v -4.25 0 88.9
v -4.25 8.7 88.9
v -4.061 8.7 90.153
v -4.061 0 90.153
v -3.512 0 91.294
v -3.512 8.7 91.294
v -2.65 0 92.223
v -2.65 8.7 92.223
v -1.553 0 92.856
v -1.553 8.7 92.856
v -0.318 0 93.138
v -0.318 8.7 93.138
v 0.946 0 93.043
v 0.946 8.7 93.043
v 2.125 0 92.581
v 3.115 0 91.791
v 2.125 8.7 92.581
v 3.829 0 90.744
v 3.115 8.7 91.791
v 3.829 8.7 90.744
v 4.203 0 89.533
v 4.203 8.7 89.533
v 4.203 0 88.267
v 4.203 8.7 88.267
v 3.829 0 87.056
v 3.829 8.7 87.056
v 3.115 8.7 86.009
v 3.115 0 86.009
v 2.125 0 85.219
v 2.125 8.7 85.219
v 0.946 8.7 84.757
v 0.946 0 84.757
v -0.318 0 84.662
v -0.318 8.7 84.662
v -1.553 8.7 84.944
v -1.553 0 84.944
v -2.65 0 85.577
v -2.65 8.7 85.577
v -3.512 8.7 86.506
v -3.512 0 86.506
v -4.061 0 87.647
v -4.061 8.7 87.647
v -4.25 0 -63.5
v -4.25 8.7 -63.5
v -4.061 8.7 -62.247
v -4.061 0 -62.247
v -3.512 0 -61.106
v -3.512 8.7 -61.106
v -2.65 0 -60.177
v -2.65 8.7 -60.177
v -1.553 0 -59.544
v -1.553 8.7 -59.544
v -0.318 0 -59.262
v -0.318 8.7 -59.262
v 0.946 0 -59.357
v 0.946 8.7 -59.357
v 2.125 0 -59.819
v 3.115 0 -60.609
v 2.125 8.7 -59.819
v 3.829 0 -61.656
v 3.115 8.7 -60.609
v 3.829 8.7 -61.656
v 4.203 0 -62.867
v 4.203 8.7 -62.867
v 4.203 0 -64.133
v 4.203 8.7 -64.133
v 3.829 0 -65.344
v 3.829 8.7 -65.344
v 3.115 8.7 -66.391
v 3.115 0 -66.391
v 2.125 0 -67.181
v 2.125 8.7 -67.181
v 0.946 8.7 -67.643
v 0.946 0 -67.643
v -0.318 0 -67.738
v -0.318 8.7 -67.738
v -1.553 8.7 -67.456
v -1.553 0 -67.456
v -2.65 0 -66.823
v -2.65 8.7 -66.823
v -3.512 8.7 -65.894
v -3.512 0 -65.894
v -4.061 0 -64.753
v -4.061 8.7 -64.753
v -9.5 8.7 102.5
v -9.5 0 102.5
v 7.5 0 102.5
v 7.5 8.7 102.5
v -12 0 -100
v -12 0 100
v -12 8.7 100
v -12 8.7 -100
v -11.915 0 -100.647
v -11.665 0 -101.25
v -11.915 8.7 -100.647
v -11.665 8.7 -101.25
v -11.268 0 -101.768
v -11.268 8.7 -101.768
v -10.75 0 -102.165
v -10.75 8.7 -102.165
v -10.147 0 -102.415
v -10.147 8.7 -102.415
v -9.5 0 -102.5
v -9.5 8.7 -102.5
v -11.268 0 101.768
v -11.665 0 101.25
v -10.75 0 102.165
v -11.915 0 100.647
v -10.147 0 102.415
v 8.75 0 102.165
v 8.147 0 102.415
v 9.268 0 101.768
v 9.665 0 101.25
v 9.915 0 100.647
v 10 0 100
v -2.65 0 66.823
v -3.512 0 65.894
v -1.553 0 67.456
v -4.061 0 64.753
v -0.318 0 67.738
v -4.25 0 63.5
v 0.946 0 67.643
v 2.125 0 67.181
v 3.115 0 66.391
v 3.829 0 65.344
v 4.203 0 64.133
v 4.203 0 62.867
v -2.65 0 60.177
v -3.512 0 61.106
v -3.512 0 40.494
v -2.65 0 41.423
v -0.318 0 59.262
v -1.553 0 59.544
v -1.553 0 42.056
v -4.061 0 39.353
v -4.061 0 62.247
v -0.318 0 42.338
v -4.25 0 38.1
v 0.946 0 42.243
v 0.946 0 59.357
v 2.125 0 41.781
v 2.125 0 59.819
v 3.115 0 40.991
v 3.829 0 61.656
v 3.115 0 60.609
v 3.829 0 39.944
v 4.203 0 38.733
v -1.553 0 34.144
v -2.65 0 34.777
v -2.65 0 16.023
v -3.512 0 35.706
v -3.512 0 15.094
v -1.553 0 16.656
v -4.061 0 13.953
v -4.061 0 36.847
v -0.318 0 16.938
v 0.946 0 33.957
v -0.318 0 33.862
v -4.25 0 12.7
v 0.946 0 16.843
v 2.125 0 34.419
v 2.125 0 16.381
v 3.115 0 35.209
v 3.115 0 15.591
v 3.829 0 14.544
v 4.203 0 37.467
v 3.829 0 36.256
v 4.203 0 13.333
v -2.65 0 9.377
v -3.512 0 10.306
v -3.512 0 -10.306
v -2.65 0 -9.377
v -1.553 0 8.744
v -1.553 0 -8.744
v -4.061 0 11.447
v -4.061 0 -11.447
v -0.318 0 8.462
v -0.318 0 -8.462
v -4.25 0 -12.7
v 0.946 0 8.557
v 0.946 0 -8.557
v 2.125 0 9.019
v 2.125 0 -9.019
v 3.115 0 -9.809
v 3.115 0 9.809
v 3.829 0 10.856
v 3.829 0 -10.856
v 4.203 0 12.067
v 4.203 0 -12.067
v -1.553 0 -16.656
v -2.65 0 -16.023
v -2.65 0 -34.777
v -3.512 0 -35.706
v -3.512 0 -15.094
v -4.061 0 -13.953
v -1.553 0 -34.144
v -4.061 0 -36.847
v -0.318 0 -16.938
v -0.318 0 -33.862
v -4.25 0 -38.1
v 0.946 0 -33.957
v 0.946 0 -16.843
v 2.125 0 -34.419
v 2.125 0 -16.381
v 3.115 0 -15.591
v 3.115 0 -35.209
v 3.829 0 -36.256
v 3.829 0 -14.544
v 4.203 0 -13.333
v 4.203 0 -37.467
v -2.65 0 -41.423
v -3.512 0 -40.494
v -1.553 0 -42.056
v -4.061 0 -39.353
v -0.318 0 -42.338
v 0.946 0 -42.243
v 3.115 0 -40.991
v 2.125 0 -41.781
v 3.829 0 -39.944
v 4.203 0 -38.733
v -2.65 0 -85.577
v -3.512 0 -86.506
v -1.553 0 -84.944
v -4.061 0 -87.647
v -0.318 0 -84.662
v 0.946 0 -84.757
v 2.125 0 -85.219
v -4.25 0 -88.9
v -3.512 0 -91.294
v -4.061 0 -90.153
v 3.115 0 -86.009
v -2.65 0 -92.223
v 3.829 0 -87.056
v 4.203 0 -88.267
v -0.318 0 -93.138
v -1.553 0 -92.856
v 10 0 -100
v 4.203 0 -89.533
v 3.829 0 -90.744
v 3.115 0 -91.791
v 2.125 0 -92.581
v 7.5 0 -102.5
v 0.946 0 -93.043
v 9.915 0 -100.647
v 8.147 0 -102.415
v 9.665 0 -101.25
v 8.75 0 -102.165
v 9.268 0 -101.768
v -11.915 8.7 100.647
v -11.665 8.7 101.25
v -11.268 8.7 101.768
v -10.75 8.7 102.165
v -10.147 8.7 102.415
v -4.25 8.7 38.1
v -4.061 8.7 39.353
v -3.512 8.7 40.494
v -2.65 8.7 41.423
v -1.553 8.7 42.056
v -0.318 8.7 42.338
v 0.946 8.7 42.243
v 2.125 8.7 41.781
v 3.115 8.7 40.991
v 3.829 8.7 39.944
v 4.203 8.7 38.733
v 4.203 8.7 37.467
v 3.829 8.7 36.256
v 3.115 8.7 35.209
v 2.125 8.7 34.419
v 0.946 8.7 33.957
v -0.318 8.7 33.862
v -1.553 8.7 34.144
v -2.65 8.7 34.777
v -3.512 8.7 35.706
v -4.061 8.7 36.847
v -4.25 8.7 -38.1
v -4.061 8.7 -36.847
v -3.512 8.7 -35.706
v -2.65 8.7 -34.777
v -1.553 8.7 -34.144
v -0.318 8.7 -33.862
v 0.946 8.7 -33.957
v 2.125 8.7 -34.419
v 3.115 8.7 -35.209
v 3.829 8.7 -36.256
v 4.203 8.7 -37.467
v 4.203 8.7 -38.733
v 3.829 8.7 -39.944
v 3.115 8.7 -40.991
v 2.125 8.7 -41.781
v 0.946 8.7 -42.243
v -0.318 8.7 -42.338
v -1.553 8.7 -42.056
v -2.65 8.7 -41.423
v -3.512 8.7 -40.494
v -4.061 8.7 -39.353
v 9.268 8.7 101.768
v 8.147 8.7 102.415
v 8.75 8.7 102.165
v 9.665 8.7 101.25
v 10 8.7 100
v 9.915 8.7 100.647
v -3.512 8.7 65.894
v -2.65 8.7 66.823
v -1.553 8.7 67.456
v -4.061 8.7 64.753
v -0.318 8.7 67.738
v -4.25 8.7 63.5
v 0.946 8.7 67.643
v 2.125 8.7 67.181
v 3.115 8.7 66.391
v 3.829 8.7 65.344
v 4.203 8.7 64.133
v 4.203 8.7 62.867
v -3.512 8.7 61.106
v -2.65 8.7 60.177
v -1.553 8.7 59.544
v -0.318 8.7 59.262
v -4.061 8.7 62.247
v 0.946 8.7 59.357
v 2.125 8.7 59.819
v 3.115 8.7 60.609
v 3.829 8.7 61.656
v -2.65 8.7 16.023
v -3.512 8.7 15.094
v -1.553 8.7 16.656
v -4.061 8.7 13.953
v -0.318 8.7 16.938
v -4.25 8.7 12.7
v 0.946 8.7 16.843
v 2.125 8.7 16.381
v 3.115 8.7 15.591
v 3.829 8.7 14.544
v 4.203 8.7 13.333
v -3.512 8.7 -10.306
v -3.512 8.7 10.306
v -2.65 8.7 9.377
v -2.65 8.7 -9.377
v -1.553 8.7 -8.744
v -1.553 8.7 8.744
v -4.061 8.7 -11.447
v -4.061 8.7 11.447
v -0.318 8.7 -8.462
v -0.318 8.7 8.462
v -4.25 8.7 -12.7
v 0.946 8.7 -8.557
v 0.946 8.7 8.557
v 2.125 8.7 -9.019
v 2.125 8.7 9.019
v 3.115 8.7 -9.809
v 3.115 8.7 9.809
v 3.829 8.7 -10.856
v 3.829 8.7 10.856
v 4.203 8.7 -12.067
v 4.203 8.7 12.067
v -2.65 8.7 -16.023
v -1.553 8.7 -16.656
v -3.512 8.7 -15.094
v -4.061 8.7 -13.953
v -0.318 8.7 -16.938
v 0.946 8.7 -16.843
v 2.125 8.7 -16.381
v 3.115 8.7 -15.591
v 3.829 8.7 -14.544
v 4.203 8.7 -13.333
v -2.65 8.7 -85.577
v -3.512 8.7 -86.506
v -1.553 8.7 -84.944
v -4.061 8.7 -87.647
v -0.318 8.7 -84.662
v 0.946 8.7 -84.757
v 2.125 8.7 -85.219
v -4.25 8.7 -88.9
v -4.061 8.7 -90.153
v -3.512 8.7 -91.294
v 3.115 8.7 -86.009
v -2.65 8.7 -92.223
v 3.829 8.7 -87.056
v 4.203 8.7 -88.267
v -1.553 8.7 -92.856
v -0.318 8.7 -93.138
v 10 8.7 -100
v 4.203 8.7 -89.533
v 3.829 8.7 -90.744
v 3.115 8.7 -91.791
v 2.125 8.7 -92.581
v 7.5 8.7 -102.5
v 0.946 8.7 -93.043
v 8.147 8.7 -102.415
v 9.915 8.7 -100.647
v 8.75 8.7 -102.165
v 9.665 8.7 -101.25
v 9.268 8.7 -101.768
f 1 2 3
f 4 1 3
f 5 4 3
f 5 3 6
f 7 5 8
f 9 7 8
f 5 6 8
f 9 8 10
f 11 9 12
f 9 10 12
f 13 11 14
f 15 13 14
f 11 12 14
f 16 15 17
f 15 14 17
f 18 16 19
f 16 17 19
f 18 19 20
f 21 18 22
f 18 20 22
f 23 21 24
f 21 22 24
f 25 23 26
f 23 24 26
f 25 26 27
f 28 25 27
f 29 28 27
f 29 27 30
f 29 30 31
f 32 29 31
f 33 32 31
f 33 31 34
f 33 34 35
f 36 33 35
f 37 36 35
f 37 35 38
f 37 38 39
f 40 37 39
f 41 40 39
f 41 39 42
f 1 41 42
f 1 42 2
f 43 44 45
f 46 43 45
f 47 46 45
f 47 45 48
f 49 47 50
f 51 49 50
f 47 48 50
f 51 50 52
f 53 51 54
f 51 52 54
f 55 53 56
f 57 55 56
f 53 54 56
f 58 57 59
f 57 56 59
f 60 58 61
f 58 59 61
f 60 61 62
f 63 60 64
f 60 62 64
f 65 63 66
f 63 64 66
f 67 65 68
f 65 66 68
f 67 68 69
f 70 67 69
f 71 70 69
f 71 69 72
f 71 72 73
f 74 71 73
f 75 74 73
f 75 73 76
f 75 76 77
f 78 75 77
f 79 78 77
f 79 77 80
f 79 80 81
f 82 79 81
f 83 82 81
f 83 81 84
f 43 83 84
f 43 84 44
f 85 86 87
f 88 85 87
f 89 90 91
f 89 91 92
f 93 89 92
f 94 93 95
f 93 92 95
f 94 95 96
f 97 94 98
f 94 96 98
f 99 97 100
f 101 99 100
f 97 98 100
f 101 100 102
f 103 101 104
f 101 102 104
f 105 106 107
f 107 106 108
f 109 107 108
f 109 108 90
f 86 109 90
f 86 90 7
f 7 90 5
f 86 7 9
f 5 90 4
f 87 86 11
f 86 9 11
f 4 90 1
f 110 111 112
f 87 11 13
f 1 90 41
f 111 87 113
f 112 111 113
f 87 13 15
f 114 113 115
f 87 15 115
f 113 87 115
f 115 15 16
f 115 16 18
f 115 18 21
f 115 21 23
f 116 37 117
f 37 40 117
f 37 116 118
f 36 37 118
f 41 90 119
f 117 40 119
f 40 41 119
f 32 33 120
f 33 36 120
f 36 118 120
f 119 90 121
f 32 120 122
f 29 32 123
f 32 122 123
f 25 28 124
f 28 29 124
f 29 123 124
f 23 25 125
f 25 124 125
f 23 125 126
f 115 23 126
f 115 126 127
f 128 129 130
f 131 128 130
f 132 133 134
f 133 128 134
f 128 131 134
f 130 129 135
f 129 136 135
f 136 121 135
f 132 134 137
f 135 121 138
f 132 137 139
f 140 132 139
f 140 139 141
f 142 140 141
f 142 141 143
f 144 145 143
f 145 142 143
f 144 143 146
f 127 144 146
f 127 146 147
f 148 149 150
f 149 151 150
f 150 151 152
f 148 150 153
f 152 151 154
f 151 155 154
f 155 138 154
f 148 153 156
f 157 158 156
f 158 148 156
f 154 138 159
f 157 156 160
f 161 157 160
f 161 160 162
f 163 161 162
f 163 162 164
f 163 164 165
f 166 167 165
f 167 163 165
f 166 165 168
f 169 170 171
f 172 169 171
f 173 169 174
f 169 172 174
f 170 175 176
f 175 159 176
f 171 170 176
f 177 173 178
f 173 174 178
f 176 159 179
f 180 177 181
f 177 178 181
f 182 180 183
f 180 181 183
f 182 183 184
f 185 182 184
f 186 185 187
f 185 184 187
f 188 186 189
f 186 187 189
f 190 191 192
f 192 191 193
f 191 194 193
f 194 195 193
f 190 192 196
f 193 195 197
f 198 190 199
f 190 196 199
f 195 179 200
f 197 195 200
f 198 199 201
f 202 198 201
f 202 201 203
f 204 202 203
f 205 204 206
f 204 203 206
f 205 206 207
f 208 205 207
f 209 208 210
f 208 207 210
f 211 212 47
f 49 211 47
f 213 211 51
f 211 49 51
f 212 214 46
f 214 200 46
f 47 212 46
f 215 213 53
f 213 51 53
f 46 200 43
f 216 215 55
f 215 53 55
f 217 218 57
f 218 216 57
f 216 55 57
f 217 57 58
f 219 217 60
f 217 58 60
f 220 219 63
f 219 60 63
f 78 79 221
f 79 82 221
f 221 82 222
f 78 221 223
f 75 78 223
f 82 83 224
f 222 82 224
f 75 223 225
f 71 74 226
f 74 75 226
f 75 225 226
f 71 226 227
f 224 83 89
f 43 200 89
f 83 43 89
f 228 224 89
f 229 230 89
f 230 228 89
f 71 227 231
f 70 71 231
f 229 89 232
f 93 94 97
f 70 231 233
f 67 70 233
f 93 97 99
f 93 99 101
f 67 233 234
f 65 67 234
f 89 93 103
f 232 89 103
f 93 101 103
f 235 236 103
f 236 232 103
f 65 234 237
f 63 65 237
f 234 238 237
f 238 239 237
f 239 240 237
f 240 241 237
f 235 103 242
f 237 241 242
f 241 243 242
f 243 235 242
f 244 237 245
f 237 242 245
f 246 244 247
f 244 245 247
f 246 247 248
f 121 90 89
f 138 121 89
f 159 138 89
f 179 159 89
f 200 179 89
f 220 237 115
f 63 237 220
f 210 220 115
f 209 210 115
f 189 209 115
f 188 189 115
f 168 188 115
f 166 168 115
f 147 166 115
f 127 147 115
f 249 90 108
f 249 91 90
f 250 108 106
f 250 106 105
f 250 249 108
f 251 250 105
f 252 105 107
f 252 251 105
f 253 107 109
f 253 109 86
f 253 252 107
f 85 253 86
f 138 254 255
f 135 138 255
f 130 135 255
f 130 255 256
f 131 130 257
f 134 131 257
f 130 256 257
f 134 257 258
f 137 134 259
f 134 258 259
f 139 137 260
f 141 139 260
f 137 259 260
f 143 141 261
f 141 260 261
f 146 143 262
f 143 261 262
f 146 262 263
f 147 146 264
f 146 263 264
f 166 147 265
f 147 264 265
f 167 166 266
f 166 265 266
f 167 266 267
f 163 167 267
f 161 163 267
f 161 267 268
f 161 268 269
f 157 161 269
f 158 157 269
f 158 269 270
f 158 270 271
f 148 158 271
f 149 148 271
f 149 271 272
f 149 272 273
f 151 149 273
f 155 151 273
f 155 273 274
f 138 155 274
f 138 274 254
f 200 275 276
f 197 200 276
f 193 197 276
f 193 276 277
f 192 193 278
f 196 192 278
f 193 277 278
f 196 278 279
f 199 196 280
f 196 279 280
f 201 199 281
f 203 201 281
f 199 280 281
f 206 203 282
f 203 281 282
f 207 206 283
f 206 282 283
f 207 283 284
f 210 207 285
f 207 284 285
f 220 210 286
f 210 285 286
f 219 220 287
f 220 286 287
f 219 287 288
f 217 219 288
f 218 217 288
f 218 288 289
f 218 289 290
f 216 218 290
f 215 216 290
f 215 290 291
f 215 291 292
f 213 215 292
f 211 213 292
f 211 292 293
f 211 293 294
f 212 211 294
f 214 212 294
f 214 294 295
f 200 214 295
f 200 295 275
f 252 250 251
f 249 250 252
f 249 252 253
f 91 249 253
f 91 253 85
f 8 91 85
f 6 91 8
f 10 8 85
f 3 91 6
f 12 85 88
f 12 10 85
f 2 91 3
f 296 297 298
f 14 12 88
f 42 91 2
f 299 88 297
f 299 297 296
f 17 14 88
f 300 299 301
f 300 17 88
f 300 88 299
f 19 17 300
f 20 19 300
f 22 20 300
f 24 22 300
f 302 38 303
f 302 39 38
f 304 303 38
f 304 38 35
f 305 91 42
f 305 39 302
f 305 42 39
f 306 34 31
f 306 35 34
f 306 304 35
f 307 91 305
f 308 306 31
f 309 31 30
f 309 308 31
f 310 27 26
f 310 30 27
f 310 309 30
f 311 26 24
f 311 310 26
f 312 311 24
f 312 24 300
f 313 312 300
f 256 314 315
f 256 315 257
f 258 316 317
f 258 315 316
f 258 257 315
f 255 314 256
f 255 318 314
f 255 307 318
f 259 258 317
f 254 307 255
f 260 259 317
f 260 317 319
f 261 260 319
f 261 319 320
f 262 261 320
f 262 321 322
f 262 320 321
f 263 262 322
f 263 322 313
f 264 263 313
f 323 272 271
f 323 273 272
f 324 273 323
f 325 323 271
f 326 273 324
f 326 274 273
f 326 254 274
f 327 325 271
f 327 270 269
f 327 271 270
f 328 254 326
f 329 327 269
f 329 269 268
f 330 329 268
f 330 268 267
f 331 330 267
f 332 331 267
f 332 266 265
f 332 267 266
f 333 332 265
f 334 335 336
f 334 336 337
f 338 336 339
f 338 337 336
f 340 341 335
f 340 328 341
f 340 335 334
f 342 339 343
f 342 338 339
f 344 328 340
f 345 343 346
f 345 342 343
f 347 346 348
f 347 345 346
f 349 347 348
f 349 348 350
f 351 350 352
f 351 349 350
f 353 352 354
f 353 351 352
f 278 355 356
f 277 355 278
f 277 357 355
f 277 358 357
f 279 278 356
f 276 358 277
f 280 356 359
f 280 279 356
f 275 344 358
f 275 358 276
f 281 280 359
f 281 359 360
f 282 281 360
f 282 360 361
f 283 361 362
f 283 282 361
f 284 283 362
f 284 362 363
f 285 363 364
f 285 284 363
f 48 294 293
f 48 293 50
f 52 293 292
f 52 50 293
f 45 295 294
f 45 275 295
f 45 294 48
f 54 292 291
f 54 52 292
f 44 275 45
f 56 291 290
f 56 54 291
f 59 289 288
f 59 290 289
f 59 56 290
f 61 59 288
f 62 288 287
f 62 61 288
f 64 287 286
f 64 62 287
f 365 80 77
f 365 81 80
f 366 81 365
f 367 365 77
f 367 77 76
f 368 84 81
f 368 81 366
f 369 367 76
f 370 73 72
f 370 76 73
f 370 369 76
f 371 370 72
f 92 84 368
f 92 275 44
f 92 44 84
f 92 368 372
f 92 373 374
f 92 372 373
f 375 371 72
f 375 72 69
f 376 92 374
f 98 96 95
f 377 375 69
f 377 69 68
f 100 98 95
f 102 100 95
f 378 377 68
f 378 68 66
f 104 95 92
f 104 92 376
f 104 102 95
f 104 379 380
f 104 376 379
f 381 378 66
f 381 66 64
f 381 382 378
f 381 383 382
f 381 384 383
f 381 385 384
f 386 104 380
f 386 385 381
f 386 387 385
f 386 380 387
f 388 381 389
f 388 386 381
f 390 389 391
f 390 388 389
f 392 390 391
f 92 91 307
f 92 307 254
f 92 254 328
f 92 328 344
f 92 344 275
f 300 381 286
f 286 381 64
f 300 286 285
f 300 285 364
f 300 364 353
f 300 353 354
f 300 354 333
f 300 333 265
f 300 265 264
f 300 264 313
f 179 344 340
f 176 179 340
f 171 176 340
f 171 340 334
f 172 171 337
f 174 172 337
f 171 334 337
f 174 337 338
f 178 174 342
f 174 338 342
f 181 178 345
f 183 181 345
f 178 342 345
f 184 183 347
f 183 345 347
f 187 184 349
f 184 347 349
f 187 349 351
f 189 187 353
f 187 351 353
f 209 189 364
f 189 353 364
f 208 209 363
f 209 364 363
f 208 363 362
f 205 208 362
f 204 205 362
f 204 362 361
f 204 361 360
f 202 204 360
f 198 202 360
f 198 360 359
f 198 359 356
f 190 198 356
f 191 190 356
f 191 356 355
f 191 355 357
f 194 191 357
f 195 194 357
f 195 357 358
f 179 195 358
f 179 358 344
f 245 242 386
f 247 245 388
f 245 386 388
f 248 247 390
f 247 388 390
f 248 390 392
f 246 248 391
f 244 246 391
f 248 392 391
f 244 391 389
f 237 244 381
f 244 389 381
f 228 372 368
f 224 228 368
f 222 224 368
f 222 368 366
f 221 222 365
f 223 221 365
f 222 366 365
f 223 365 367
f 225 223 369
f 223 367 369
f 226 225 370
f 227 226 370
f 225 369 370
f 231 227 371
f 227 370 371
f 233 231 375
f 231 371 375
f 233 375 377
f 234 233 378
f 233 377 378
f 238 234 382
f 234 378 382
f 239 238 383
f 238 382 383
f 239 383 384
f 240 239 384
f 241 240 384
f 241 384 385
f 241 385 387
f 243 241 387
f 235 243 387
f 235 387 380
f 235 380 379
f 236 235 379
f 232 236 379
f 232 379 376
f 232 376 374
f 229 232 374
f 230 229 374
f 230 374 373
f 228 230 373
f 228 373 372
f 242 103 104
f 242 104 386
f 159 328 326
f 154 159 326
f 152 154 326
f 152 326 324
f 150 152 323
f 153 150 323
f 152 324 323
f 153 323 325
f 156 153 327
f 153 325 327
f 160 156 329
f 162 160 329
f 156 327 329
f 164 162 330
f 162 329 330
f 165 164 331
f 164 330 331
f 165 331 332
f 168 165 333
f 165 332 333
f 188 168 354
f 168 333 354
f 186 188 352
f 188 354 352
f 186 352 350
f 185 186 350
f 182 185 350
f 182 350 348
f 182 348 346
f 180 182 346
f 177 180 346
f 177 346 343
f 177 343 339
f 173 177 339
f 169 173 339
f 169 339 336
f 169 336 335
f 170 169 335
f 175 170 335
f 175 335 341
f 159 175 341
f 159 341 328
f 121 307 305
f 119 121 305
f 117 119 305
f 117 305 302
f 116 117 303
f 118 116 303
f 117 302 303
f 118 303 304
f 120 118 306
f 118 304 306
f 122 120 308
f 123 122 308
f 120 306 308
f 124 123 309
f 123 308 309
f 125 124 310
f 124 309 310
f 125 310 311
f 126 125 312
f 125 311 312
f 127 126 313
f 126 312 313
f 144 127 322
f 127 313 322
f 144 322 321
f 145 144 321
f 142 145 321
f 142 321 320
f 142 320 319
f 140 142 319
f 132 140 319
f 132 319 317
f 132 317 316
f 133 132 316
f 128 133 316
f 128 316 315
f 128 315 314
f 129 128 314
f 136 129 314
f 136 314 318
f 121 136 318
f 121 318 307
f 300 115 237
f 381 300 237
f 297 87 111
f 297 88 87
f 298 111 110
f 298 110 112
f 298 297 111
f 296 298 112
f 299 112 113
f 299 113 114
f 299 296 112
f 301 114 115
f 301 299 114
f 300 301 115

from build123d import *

# Parameters (mm, degrees)
SKETCH1_W            = 22
SKETCH1_H            = 205
BOSS_EXTRUDE1_DEPTH  = 8.7
M8_CLEARANCE_HOLE1_D = 8.5
LPATTERN1_COUNT      = 8
LPATTERN1_PITCH      = 25.4
FILLET1_R            = 2.5


with BuildPart() as part:
    # Sketch1 → Boss-Extrude1 (new body)
    with BuildSketch(Plane(origin=(0, 0, 0), x_dir=(1, 0, 0), z_dir=(0, 1, 0))):
        with Locations((-1, 0)):
            Rectangle(SKETCH1_W, SKETCH1_H)
    extrude(amount=BOSS_EXTRUDE1_DEPTH)

    # M8 Clearance Hole1 (through all)
    with Locations(Plane.XZ):
        with Locations((0, 88.9)):
            m8_clearance_hole1 = Hole(M8_CLEARANCE_HOLE1_D / 2)

    # LPattern1: M8 Clearance Hole1 ×8
    with Locations(*[(0, 0, -i * LPATTERN1_PITCH) for i in range(1, LPATTERN1_COUNT)]):
        add(m8_clearance_hole1, mode=Mode.SUBTRACT)

    # Fillet1
    fillet1_edges = [part.edges().sort_by_distance(p)[0] for p in [
        (10, 4.35, 102.5),
        (-12, 4.35, 102.5),
        (-12, 4.35, -102.5),
        (10, 4.35, -102.5),
    ]]
    fillet(fillet1_edges, radius=FILLET1_R)


solid = part.part
